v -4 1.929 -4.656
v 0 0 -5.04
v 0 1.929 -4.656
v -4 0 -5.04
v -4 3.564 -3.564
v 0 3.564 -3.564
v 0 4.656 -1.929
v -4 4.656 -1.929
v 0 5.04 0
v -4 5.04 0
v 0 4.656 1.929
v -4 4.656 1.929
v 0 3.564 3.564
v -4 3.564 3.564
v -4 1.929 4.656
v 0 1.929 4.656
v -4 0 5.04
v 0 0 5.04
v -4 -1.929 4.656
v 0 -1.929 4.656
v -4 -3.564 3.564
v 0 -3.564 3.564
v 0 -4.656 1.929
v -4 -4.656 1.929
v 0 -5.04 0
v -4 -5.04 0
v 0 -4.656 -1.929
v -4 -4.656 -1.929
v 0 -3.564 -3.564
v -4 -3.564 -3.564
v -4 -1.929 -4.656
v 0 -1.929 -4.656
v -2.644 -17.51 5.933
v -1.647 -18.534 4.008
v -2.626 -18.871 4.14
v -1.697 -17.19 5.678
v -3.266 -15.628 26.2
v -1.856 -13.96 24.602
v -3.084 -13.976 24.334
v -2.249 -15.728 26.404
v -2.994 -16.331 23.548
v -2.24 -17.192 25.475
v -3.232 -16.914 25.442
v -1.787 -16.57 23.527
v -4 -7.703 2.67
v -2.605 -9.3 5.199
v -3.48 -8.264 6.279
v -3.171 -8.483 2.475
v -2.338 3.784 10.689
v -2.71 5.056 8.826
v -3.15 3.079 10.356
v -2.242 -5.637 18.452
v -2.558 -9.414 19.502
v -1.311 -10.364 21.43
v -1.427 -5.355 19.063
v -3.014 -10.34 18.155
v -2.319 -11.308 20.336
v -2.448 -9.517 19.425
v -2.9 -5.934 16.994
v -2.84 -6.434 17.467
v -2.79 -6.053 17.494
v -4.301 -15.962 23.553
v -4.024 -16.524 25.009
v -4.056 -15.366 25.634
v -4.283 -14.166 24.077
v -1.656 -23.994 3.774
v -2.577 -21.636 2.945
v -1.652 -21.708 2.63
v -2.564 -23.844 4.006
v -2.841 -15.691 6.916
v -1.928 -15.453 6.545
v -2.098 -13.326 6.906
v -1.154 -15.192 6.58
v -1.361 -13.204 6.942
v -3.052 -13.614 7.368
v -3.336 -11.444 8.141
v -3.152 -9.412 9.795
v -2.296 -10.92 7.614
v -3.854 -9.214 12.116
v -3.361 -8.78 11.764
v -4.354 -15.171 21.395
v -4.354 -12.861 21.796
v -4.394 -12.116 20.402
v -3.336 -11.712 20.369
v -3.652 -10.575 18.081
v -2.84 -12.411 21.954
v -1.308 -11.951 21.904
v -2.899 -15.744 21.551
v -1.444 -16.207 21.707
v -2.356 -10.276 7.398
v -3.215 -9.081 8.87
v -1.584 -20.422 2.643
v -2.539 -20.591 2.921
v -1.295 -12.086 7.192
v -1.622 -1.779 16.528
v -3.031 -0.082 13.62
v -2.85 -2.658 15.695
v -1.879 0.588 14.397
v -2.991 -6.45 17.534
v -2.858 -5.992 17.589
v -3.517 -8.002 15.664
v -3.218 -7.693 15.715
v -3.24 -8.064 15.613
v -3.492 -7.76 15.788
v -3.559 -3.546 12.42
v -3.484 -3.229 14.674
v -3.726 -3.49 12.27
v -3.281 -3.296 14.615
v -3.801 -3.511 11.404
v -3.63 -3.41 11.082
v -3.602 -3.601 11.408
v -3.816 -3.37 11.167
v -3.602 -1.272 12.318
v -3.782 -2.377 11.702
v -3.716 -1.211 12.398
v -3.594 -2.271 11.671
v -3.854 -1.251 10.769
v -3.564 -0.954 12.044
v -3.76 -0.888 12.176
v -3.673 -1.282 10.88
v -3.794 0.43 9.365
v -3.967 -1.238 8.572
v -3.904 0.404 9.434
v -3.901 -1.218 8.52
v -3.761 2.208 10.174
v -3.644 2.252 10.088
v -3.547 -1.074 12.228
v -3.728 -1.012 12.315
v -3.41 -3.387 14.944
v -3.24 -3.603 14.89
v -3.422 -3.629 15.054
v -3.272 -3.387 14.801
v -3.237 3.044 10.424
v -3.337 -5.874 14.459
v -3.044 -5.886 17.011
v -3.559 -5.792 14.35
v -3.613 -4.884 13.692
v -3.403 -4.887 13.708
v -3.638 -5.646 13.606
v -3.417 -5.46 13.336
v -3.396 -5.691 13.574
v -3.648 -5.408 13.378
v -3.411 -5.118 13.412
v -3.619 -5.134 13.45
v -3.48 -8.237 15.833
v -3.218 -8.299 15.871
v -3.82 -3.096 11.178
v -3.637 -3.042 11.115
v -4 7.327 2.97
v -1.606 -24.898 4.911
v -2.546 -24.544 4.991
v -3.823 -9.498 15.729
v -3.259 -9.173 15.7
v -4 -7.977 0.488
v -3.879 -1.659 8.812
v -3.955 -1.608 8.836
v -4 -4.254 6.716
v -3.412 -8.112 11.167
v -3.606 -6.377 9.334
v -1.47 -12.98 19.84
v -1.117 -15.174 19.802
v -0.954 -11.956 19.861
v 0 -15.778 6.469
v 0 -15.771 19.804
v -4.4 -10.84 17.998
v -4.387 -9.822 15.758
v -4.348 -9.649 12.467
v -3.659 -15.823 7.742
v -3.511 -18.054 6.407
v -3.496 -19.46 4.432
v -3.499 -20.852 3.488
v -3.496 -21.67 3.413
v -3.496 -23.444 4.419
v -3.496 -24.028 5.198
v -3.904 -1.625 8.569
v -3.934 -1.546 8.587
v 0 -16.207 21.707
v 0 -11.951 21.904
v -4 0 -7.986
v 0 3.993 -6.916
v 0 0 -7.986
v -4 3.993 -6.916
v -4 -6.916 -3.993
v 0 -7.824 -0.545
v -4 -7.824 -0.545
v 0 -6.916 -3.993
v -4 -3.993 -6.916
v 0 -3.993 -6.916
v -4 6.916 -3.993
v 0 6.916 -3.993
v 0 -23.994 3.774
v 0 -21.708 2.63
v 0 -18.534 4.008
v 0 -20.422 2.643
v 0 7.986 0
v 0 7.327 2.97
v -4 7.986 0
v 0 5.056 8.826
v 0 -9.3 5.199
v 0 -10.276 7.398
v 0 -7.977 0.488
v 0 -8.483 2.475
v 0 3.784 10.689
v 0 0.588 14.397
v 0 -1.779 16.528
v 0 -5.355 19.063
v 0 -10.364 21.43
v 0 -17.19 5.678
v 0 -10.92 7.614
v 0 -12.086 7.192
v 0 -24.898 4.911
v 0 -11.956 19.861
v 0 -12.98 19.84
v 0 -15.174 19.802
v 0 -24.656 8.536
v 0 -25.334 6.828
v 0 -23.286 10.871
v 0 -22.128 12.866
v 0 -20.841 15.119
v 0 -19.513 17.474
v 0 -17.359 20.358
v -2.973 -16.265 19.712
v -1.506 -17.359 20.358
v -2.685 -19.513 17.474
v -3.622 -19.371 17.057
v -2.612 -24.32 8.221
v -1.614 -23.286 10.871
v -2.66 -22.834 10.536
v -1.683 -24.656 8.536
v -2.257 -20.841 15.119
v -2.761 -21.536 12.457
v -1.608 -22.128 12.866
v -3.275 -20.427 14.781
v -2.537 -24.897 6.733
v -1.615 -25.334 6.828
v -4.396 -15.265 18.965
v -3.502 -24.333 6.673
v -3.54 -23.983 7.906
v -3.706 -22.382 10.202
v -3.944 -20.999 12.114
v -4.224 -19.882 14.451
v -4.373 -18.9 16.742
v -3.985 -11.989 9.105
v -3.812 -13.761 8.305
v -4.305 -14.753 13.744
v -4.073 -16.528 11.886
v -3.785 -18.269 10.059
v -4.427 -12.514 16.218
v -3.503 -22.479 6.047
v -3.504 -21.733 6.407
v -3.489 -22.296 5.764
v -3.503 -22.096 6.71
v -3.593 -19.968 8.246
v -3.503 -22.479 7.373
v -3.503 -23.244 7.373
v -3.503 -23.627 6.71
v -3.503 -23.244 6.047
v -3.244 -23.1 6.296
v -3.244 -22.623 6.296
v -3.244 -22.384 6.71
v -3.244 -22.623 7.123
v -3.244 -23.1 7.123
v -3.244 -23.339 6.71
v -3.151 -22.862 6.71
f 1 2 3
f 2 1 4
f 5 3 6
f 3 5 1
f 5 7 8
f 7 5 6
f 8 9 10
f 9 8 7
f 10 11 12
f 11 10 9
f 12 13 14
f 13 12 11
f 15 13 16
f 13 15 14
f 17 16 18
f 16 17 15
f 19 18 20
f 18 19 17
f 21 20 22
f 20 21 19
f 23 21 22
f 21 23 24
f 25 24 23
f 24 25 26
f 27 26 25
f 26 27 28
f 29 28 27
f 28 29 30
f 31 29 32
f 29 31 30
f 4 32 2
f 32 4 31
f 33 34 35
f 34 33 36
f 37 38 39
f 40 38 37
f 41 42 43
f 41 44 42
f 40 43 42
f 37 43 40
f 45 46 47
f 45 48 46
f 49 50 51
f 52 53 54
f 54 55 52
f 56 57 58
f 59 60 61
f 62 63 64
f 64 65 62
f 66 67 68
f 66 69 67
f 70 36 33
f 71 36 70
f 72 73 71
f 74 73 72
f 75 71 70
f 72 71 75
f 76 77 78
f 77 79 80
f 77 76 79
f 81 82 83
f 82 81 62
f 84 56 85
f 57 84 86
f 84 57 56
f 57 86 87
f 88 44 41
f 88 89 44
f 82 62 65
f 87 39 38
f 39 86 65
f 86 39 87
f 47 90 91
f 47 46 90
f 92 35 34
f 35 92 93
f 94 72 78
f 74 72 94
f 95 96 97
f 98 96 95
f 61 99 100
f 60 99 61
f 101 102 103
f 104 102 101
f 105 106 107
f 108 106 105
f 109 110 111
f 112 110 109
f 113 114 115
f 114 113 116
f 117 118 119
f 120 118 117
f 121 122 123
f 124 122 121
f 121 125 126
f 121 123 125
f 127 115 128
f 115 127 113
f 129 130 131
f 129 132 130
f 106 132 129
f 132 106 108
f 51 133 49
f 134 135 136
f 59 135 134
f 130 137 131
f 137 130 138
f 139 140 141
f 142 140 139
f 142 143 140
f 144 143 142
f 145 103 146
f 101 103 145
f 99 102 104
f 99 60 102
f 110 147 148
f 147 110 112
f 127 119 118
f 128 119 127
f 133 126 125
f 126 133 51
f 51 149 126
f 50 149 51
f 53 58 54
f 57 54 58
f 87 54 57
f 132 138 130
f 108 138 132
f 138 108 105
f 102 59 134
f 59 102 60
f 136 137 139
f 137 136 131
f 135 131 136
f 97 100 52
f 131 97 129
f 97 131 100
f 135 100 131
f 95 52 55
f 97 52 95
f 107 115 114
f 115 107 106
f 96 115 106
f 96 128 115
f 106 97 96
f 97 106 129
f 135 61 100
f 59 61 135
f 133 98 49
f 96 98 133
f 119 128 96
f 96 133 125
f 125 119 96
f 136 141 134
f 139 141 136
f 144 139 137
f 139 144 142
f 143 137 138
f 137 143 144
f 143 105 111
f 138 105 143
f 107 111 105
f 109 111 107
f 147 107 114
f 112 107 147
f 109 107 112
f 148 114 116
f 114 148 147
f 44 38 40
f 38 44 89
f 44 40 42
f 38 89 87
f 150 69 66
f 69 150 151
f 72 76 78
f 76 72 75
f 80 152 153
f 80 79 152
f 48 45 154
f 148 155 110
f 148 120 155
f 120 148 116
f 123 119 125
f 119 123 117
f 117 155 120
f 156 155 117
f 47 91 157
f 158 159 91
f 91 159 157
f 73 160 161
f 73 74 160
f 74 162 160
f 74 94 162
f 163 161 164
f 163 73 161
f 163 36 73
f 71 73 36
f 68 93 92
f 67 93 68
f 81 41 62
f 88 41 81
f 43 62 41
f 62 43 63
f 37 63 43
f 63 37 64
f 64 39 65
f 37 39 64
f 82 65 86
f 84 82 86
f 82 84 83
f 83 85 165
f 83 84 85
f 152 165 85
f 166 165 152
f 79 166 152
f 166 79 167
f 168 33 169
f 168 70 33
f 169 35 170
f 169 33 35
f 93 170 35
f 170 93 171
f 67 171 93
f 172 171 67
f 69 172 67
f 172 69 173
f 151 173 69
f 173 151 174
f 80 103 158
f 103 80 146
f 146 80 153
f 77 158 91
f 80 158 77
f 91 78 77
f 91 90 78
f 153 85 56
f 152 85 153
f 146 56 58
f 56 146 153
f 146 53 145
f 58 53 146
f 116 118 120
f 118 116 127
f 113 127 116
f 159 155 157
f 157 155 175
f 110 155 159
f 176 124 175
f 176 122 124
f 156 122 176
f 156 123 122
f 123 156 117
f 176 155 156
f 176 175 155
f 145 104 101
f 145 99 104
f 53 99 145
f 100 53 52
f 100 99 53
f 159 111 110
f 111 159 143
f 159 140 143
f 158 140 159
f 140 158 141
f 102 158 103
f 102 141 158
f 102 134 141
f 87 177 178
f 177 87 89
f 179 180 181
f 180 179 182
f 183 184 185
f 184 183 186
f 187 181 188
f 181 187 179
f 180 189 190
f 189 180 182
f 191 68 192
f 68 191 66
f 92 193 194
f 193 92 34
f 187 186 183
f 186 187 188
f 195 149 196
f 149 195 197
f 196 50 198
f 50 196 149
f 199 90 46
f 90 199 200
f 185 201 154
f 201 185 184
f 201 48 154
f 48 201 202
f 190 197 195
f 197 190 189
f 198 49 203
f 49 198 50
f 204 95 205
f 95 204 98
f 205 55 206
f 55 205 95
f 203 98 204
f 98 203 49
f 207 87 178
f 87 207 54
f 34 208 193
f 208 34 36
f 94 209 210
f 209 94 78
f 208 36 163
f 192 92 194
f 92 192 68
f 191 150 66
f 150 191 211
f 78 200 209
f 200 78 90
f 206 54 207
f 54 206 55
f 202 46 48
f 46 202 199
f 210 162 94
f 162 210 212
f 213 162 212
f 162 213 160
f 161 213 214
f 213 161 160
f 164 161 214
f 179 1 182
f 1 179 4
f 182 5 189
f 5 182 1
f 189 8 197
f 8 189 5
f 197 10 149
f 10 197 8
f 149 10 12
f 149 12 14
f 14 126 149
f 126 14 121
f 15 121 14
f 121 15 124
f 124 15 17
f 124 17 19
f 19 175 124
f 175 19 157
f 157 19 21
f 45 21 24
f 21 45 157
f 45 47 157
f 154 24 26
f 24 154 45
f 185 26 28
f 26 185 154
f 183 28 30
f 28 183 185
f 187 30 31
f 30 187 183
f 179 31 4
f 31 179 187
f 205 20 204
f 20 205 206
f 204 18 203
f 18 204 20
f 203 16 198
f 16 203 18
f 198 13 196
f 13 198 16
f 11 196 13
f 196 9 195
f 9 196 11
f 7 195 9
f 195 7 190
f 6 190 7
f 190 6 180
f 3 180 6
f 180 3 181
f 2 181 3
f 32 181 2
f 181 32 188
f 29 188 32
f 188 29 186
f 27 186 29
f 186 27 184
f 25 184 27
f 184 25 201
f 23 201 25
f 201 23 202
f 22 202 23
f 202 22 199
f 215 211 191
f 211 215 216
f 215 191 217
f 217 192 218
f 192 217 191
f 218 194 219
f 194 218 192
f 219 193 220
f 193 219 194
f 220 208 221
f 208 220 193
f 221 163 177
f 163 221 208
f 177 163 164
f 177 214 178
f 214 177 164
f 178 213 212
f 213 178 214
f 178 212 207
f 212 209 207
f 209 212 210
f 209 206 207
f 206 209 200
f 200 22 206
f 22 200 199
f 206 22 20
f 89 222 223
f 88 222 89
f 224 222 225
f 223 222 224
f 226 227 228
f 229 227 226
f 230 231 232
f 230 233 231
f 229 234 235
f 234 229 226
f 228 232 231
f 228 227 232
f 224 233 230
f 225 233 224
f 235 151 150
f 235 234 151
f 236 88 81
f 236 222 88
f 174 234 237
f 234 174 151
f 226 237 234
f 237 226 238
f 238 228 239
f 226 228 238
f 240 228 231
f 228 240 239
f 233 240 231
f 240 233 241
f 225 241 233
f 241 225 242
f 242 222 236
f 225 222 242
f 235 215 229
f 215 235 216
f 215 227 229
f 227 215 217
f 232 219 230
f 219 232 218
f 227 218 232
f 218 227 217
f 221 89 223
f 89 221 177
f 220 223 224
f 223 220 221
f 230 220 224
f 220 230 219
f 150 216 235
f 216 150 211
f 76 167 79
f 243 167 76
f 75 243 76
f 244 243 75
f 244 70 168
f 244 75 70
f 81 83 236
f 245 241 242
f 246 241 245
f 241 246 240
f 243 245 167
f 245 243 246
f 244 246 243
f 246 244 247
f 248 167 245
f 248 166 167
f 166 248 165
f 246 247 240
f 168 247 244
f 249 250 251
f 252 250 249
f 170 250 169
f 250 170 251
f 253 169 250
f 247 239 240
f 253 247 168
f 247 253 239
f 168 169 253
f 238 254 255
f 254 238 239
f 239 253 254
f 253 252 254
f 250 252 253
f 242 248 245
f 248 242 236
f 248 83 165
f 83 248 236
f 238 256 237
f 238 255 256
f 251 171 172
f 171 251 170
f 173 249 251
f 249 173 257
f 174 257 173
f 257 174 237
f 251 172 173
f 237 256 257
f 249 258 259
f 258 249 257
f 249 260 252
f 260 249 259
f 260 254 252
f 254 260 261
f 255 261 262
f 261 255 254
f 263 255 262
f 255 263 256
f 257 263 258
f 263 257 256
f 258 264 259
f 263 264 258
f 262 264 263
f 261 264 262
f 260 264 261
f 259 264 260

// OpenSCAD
use <../lib.scad>
use <10350.scad>
function ldraw_lib__10351() = [
// 0 ~Animal Horse Poseable Head Right
// 0 Name: 10351.dat
// 0 Author: Philippe Hurbain [Philo]
// 0 !LDRAW_ORG Part UPDATE 2013-02
// 0 !LICENSE Licensed under CC BY 4.0 : see CAreadme.txt
// 
// 0 BFC CERTIFY CCW
  [0,"BFC","CERTIFY"],
  [0,"BFC","CCW"],
// 
// 0 !HISTORY 2013-11-18 {LEGO Digital Designer} Original part shape
// 0 !HISTORY 2013-11-18 [Philo] File preparation for LDraw Parts Tracker
// 0 !HISTORY 2013-12-23 [PTadmin] Official Update 2013-02
// 
// 
// 1 16 0 0 0 -1 0 0 0 1 0 0 0 1 10350.dat
  [1,16,0,0,0,-1,0,0,0,1,0,0,0,1, ldraw_lib__10350()],
];
module ldraw_lib__10351(step=0, col=false, unit=2/5, alt=false, line=0.2, solid=!$preview)
    makepoly(ldraw_lib__10351(), step=step, col=col, unit=unit, alt=alt, line=line, solid=solid);
ldraw_lib__10351(line=0.2);
